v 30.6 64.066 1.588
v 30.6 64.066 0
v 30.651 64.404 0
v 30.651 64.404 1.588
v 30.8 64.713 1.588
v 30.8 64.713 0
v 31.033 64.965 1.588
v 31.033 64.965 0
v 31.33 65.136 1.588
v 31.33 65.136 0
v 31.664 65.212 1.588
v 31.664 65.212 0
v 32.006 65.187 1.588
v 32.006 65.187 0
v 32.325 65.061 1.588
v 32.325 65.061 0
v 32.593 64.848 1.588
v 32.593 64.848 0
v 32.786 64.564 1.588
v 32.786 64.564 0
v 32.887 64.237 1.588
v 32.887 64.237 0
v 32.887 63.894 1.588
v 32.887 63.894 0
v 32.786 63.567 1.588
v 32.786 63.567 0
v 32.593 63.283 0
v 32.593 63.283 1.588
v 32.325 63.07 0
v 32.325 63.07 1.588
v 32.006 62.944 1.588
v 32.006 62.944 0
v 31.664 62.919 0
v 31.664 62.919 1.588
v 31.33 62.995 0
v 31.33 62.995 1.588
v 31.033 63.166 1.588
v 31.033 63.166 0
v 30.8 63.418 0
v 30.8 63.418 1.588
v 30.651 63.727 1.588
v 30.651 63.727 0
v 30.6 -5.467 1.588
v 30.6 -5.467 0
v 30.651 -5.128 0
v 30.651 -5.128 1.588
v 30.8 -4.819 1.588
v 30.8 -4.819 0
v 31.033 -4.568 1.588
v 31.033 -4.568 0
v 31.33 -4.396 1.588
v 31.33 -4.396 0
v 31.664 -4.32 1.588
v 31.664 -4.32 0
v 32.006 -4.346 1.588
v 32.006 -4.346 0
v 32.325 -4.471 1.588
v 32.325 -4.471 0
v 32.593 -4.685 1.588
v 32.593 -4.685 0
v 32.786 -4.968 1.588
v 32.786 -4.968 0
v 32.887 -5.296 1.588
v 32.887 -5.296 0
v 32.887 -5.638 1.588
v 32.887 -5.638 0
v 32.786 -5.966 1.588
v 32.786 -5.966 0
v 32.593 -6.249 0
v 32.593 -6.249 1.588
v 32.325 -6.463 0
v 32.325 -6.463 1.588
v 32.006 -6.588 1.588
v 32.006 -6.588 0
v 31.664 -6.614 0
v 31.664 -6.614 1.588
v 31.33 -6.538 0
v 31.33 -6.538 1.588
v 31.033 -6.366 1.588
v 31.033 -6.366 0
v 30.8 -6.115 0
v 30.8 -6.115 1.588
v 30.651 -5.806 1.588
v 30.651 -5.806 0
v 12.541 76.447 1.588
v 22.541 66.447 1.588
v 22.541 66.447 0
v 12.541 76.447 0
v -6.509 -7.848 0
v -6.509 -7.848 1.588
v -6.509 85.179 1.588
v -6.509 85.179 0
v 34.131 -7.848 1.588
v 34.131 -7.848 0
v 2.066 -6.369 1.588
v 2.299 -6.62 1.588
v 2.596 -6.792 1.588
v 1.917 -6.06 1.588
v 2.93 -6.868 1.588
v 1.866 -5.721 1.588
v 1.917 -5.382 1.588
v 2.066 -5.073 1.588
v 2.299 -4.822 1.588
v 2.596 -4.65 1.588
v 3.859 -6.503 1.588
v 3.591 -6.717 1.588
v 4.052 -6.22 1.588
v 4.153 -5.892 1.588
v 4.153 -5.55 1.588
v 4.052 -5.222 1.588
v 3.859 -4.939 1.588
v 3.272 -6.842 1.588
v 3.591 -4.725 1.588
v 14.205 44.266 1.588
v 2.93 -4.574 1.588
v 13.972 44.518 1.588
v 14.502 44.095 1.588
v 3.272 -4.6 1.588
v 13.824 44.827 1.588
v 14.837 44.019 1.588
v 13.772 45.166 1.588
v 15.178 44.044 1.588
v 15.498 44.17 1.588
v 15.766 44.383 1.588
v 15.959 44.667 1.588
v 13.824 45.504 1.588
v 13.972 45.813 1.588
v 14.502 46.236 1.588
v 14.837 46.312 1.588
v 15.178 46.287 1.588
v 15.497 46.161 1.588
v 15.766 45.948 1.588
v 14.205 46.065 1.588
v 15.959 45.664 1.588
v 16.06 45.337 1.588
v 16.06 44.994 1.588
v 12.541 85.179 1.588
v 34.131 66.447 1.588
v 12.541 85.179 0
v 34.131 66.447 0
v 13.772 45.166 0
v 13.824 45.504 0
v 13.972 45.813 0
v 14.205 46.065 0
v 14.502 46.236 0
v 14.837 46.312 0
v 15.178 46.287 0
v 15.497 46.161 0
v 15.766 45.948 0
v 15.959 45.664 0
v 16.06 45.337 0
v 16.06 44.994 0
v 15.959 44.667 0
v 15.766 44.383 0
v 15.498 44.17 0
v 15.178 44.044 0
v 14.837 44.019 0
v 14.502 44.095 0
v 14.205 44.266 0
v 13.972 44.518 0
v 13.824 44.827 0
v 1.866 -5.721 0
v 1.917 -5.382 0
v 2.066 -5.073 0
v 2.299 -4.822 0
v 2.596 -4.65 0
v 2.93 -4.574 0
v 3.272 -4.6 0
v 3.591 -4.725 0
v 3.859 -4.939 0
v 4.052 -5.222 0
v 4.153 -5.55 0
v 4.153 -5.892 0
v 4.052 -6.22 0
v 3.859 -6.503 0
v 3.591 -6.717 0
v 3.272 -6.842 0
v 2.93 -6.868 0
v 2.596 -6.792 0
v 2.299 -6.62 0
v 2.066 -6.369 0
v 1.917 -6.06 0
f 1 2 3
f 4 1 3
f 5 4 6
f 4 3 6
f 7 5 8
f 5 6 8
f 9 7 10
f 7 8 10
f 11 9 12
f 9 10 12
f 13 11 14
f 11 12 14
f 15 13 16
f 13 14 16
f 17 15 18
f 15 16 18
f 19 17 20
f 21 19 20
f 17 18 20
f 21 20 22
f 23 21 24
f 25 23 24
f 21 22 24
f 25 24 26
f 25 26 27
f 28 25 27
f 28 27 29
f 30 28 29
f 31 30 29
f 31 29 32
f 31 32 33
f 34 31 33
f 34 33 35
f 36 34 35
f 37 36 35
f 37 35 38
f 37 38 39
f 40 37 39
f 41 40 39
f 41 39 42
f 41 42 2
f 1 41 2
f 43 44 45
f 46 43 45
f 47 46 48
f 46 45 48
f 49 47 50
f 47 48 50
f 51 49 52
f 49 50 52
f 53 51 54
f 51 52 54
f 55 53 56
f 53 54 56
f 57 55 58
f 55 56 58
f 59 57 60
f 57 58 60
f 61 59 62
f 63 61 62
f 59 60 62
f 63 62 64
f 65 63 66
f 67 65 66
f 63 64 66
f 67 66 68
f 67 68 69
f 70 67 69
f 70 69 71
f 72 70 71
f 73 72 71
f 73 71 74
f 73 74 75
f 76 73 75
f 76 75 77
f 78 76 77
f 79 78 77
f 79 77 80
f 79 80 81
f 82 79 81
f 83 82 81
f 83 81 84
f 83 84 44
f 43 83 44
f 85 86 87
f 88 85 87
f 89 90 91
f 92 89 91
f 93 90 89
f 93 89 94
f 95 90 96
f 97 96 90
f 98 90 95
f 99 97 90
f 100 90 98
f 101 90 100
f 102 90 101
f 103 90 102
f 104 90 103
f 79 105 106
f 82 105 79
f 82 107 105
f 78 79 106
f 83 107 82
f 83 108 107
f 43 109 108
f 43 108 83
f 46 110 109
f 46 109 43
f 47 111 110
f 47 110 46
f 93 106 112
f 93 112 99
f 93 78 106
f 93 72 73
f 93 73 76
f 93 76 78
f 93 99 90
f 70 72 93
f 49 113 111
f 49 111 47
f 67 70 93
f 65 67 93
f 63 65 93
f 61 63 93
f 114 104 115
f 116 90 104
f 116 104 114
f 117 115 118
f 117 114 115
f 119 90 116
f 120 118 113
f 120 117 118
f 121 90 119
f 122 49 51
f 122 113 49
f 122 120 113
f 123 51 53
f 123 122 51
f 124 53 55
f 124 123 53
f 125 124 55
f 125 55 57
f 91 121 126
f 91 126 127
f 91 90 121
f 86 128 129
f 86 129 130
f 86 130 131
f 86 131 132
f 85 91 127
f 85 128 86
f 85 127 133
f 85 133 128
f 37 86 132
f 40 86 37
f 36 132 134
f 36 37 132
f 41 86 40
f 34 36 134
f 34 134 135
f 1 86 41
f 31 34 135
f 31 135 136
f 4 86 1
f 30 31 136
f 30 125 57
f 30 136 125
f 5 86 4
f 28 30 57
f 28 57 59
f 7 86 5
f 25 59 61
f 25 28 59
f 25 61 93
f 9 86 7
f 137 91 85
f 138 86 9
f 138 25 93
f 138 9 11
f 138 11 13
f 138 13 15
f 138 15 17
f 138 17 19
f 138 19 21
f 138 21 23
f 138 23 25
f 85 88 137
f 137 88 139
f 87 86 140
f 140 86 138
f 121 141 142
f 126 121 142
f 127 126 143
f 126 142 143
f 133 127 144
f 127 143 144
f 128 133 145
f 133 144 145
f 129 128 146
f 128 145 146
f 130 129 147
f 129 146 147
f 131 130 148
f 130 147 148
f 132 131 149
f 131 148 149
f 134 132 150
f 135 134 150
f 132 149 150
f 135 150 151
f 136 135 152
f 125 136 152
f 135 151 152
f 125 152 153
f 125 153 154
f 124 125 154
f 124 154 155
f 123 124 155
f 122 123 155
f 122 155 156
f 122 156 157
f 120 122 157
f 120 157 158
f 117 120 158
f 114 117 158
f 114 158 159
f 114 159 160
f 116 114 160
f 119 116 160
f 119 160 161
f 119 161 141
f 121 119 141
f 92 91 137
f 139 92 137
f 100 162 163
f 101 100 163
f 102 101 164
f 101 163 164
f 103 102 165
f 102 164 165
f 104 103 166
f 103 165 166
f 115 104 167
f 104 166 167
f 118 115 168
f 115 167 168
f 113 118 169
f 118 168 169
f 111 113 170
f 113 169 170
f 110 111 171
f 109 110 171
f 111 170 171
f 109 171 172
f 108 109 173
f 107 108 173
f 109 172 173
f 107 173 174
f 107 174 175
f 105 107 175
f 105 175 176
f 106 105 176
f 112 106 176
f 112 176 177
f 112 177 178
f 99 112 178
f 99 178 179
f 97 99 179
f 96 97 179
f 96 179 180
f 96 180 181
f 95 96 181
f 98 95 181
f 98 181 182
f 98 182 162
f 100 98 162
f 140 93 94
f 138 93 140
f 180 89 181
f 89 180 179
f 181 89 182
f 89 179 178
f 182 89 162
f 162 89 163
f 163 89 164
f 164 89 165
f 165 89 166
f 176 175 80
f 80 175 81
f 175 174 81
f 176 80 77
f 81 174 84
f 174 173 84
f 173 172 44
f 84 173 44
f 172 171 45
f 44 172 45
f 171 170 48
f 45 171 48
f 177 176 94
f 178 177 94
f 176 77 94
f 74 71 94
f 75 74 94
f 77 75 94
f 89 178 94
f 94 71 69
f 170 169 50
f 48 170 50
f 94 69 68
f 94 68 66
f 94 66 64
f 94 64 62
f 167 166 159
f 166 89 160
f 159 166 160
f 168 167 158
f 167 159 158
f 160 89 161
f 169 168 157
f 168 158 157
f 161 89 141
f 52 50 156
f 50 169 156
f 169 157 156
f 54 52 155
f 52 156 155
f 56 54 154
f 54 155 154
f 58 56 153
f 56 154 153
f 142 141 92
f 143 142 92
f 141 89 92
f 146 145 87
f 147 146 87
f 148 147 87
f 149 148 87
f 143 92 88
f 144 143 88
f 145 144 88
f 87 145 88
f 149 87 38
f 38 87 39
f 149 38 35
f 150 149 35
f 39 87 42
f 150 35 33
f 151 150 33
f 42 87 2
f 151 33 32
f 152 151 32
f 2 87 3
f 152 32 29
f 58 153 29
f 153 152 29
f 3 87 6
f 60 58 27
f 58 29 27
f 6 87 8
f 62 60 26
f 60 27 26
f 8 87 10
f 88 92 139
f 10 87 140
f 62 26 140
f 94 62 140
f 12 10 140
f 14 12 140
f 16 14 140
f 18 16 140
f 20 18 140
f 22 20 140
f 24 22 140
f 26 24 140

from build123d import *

# Parameters (mm, degrees)
SKETCH1_W                  = 19.05
SKETCH1_H                  = 88.9
BOSS_EXTRUDE1_DEPTH        = 1.5875
SKETCH4_W                  = 21.59
SKETCH4_H                  = 71.755
BOSS_EXTRUDE2_DEPTH        = 1.5875
CHAMFER1_SIZE              = 10
SKETCH5_W                  = 40.64
SKETCH5_H                  = 2.54
SKETCH5_W_2                = 19.05
SKETCH5_H_2                = 1.5875
BOSS_EXTRUDE3_DEPTH        = 1.5875
F_2_3_2_3_DIAMETER_HOLE1_D = 2.3


with BuildPart() as part:
    # Sketch1 → Boss-Extrude1 (new body)
    with BuildSketch(Plane.XY):
        with Locations((3.01625, 39.14175)):
            Rectangle(SKETCH1_W, SKETCH1_H)
    extrude(amount=BOSS_EXTRUDE1_DEPTH)

    # Sketch4 → Boss-Extrude2 (add, through all)
    with BuildSketch(Plane.XY.offset(1.5875)):
        with Locations((23.33625, 30.56925)):
            Rectangle(SKETCH4_W, SKETCH4_H)
    extrude(amount=-BOSS_EXTRUDE2_DEPTH)

    # Chamfer1
    chamfer1_edges = [part.edges().sort_by_distance(p)[0] for p in [
        (12.54125, 66.44675, 0.79375),
    ]]
    chamfer(chamfer1_edges, length=CHAMFER1_SIZE)

    # Sketch5 → Boss-Extrude3 (add, through all)
    with BuildSketch(Plane.XY.offset(1.5875)):
        with Locations((13.81125, -6.57825)):
            Rectangle(SKETCH5_W, SKETCH5_H)
        with Locations((3.01625, 84.3855)):
            Rectangle(SKETCH5_W_2, SKETCH5_H_2)
    extrude(amount=-BOSS_EXTRUDE3_DEPTH)

    # Ø2.3 (2.3) Diameter Hole1 (through all)
    with Locations(Plane.XY.offset(1.5875)):
        with Locations((14.9225, 45.1655), (31.75, 64.0655), (31.75, -5.467), (3.01625, -5.721)):
            Hole(F_2_3_2_3_DIAMETER_HOLE1_D / 2)


solid = part.part
